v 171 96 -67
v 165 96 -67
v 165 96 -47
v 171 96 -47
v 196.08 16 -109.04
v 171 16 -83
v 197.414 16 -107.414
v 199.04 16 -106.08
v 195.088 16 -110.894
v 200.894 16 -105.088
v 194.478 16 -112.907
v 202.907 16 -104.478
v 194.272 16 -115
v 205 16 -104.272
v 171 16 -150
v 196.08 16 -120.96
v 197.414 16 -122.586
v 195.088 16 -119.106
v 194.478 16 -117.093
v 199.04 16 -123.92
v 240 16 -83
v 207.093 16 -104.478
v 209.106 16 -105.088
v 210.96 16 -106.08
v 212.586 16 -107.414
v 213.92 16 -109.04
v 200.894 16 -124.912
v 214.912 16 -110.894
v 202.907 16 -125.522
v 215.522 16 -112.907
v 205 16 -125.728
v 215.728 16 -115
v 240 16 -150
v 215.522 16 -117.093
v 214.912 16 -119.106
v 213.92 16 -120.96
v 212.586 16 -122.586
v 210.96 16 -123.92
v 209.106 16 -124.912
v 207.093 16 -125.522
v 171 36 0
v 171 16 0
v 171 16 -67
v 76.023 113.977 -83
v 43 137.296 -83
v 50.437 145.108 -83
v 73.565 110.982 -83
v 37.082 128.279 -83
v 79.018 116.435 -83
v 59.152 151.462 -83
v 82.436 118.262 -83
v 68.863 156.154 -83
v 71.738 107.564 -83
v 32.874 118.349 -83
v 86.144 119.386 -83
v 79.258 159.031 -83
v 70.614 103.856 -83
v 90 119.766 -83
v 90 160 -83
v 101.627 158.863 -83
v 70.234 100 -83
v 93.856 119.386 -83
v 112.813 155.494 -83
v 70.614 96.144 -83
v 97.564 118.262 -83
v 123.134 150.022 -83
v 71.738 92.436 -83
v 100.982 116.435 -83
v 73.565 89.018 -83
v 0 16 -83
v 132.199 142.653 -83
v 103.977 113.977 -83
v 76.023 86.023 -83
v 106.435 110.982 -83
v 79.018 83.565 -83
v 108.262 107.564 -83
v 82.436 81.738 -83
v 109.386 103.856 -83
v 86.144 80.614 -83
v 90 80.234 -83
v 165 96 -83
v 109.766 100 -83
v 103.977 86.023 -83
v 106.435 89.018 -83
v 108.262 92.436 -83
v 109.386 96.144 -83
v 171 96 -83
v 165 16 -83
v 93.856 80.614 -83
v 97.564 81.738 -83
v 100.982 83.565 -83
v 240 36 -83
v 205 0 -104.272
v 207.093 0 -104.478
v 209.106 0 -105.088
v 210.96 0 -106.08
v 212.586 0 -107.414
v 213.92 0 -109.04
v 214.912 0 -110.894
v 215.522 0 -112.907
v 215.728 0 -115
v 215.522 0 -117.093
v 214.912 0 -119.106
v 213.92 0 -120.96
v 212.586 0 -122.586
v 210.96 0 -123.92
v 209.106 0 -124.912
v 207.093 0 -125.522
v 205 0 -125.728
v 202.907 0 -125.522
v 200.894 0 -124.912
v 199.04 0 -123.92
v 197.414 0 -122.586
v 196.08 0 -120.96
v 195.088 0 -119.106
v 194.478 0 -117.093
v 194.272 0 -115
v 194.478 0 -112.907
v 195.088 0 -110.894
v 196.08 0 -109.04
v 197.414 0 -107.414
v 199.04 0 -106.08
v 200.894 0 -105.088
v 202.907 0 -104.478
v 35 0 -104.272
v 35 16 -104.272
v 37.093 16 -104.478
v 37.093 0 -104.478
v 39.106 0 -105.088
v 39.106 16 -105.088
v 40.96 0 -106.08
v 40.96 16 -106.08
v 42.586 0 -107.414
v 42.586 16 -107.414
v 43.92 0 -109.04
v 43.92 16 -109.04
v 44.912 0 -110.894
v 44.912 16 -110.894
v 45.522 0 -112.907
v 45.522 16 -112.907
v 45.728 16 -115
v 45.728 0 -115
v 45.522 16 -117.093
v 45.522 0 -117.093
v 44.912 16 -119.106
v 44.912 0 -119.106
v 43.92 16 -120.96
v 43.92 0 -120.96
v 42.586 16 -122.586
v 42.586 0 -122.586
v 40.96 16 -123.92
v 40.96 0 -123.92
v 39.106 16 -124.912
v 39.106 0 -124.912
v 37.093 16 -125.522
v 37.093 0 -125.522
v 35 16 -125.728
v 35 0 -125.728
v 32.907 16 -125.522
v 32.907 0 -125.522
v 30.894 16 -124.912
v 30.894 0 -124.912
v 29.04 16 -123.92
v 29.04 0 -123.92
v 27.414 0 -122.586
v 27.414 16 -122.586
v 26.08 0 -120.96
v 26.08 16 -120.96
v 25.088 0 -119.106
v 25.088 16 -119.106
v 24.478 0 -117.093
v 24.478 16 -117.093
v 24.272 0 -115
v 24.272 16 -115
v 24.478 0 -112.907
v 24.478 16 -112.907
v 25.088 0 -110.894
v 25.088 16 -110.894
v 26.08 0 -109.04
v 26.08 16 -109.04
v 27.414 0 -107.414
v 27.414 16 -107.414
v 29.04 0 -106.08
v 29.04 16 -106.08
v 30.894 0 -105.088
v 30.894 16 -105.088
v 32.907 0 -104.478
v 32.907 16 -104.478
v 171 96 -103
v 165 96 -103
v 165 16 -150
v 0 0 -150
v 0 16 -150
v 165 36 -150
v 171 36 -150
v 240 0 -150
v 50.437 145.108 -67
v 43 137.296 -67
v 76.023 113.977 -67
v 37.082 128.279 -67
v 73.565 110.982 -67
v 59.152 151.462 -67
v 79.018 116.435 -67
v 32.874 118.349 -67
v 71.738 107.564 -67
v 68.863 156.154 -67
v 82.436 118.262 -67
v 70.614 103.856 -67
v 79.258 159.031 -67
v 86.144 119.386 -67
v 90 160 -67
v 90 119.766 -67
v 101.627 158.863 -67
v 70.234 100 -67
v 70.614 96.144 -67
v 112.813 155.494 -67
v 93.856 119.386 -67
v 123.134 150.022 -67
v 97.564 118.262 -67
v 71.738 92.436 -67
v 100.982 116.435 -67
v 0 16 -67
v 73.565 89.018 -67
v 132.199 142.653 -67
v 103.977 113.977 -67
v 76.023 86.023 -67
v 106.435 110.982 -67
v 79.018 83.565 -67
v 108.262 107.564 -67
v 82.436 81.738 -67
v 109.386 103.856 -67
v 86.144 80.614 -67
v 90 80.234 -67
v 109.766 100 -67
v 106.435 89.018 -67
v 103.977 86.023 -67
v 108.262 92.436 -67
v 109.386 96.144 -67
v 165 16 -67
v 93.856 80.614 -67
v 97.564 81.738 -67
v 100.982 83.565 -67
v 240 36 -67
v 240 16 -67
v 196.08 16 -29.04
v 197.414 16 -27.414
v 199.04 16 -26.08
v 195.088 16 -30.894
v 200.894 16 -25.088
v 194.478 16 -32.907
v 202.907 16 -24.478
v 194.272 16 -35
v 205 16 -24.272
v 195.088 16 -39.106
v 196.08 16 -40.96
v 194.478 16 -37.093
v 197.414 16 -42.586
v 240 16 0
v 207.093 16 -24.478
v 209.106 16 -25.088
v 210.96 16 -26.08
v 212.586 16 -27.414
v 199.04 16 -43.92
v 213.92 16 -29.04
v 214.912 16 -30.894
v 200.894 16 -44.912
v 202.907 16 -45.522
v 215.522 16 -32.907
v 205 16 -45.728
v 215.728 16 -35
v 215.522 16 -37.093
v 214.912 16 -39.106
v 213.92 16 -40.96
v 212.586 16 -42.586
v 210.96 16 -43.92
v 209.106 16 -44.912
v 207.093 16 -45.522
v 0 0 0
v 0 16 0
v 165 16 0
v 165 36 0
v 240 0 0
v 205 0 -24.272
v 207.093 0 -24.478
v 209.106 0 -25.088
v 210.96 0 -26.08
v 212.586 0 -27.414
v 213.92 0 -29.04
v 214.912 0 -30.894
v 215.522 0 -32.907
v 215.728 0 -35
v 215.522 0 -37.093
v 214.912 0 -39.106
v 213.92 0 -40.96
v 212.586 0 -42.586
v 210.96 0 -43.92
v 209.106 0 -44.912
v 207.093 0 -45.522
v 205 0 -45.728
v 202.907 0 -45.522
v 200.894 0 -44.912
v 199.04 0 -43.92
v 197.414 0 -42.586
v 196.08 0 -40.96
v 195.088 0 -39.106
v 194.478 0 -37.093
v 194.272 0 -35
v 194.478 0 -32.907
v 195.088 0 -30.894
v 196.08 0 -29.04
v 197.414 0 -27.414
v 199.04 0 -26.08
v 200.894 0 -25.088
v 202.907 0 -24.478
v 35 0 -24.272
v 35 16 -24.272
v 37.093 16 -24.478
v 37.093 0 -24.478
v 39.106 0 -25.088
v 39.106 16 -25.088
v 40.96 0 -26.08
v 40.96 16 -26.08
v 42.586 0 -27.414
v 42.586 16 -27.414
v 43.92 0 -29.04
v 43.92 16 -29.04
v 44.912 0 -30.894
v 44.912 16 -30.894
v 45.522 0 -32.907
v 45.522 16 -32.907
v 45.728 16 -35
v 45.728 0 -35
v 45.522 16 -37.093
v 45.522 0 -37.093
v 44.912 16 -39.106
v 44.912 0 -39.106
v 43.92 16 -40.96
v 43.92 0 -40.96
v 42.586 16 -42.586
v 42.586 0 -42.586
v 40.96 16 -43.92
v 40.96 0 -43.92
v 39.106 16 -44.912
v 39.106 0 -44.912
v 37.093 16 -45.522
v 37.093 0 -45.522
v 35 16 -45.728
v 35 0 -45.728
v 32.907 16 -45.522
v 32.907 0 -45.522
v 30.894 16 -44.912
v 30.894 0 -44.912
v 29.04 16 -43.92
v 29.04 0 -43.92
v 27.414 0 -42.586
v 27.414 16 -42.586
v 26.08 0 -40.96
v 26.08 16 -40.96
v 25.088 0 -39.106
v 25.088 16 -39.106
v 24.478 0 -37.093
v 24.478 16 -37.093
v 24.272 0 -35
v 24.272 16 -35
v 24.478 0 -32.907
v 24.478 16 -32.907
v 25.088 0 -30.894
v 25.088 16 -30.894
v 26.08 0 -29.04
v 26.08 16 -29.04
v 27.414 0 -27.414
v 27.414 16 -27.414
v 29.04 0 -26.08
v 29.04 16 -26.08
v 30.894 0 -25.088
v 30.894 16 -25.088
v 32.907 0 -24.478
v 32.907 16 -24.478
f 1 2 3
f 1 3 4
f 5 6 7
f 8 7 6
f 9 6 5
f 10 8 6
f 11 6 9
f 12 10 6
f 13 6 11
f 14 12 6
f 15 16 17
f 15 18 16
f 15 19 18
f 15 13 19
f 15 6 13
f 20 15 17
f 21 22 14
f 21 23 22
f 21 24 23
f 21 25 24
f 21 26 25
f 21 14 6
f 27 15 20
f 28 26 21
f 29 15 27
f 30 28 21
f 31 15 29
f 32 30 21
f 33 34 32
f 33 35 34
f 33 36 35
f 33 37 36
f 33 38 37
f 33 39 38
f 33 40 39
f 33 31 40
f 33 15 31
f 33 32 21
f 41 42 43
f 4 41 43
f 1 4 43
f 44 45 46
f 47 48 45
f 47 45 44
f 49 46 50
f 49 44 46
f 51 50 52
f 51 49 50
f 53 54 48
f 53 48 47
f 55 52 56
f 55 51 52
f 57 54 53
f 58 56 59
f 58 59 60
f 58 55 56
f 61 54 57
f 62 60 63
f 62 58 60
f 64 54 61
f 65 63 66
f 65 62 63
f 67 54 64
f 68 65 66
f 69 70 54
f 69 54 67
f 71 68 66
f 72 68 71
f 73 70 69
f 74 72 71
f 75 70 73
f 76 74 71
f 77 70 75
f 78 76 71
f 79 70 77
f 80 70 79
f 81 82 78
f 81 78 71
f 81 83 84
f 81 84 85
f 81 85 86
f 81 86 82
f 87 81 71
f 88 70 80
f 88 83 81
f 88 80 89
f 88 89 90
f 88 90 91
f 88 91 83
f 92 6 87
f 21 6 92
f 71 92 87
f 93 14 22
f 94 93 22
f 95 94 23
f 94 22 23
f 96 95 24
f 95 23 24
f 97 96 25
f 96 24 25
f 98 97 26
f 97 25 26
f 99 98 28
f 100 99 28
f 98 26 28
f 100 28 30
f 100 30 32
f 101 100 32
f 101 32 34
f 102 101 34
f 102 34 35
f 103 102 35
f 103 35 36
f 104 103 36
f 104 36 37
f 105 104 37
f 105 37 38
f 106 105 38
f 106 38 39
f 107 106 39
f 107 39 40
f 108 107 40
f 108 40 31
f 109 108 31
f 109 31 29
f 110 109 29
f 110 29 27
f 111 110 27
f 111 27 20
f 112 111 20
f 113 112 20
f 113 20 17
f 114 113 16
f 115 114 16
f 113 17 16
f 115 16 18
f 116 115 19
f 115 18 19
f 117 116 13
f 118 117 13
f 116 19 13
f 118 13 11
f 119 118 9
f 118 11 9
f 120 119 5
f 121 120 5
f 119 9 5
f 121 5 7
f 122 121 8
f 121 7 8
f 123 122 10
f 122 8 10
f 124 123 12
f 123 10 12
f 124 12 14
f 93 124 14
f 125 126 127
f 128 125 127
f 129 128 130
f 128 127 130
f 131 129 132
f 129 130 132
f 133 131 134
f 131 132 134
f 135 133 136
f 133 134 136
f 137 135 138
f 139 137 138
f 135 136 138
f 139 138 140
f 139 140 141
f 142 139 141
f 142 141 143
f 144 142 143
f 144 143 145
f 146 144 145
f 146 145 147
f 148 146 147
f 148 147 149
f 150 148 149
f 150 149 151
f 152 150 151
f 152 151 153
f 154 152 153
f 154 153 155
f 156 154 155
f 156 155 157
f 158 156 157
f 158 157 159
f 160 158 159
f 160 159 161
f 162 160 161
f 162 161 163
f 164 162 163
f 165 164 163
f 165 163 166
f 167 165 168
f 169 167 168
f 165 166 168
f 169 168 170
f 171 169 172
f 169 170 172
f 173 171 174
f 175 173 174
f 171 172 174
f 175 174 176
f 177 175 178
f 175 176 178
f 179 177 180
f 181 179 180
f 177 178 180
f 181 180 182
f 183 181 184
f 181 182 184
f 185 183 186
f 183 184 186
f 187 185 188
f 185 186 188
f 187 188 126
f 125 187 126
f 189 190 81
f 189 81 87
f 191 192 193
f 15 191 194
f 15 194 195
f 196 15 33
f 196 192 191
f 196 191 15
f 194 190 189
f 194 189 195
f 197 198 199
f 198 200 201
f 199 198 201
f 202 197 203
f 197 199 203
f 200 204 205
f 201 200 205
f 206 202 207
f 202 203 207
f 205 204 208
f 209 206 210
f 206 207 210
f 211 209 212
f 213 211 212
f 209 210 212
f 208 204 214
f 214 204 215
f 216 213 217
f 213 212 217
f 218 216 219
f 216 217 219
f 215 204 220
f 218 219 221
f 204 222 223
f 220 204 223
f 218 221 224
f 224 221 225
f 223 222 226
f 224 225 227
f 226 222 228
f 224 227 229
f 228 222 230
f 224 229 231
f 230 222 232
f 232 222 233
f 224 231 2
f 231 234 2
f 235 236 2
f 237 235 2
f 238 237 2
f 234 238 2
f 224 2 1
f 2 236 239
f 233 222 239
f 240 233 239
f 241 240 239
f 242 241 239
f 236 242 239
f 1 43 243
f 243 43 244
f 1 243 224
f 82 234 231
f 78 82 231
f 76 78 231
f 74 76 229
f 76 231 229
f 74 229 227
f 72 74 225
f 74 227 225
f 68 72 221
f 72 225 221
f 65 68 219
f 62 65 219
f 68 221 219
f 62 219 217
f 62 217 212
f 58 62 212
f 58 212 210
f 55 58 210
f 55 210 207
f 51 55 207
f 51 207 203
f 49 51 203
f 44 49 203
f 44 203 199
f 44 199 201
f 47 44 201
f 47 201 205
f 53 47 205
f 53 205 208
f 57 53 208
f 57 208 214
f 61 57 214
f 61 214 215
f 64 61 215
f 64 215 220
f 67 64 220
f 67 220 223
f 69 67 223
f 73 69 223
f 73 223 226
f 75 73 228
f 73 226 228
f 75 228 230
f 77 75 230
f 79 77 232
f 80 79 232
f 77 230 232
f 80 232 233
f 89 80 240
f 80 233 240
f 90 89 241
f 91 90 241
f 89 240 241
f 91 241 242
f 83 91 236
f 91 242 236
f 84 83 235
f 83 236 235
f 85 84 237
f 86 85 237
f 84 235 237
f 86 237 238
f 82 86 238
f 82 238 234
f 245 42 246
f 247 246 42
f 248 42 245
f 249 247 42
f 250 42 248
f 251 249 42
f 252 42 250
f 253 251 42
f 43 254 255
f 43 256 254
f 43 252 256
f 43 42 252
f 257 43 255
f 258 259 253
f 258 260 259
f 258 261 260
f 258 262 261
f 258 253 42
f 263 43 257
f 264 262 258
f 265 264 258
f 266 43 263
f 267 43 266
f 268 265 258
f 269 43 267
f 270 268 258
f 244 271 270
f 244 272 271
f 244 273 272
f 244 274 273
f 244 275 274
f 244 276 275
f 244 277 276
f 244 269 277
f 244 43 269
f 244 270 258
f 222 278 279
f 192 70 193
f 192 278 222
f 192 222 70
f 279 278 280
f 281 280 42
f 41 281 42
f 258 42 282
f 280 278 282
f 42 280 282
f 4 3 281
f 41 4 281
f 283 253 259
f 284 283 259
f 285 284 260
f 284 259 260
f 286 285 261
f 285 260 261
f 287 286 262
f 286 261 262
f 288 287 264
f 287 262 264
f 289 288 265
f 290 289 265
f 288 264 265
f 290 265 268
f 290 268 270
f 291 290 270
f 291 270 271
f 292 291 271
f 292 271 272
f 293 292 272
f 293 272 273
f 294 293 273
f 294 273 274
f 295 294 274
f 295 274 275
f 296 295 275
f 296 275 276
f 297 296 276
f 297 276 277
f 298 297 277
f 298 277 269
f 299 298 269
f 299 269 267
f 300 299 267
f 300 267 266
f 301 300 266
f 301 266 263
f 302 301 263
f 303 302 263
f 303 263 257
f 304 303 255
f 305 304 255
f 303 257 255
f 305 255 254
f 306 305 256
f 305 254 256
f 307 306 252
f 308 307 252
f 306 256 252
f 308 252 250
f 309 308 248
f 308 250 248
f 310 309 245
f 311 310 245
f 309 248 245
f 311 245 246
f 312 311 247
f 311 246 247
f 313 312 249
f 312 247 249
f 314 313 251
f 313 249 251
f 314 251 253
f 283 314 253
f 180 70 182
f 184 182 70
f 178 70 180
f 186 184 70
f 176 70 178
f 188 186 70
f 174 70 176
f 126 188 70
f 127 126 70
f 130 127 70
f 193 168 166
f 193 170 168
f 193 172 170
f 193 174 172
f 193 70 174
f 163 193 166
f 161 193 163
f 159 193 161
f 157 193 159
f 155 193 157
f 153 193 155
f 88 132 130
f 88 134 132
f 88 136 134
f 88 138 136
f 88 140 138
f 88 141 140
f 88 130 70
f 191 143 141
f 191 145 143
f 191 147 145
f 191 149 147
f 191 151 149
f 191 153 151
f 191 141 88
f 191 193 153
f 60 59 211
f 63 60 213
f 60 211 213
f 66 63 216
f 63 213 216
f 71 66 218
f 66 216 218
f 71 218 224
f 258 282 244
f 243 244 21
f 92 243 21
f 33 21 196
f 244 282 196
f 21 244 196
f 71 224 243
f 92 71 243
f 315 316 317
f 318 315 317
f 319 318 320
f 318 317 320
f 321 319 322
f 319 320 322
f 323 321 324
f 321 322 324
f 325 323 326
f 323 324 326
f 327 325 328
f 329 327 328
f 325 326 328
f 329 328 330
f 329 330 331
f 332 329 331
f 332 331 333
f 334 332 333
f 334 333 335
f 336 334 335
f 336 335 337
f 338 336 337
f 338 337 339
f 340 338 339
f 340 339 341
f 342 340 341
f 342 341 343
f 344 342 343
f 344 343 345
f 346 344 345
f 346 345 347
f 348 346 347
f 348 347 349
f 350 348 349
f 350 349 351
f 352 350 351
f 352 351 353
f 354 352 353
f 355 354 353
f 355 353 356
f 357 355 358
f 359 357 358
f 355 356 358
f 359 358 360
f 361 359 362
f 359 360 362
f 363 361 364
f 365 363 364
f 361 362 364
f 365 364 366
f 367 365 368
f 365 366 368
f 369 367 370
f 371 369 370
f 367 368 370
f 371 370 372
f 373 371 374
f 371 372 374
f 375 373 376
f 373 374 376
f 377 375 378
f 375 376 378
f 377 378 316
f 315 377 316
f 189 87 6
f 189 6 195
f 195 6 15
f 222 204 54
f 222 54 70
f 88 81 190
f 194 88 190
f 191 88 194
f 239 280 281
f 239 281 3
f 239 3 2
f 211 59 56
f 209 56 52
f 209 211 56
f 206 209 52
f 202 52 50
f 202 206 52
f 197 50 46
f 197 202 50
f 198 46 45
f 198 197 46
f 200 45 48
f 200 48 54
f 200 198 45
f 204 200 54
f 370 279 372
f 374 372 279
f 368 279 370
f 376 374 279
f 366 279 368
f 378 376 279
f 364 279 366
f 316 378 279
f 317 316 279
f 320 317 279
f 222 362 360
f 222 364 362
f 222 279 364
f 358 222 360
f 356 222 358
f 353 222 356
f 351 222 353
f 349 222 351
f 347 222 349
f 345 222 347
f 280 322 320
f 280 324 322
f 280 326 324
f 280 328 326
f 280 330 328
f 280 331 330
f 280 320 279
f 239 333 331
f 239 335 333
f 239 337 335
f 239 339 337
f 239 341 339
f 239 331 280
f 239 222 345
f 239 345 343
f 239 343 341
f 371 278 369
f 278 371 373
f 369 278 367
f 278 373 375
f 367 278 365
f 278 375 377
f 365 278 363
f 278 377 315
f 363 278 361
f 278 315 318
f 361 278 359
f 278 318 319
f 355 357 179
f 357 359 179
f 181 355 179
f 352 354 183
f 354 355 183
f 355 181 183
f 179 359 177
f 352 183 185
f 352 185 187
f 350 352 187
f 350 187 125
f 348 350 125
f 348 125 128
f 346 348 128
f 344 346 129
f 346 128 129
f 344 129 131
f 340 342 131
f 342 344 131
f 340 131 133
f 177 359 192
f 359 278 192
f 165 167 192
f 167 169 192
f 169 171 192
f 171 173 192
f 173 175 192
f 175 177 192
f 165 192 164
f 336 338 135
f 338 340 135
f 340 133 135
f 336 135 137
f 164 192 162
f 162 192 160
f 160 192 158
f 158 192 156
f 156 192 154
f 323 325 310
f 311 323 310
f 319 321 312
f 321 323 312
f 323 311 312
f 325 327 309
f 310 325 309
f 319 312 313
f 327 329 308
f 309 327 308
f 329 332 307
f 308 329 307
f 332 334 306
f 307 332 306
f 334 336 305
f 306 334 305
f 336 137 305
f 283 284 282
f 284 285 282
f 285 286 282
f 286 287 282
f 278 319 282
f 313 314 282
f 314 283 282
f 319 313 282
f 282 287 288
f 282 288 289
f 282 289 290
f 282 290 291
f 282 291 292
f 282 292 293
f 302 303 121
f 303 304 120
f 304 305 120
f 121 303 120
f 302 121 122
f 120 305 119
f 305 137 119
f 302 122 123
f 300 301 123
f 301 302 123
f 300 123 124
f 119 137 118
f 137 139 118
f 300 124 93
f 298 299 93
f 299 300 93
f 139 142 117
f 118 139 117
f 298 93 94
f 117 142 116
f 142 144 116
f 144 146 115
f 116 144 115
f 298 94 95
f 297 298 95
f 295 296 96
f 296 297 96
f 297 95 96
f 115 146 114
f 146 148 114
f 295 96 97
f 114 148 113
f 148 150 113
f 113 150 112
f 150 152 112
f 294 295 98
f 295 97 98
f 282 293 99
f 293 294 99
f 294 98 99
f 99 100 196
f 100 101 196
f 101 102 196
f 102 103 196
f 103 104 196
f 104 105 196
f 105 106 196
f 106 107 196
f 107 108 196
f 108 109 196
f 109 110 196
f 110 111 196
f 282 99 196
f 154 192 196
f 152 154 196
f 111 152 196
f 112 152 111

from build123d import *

# Parameters (mm, degrees)
SKETCH_1_W                  = 240
SKETCH_1_H                  = 150
EXTRUDE_1_DEPTH             = 16
SKETCH_2_R                  = 10.728301902
CUT_EXTRUDE_1_DEPTH         = 284.471338939
PATTERN_LINEAR_1_COUNT      = 2
PATTERN_LINEAR_1_PITCH      = 170
PATTERN_LINEAR_1_COUNT_DIR2 = 2
PATTERN_LINEAR_1_PITCH_DIR2 = 80
SKETCH_3_W                  = 6
SKETCH_3_H                  = 150
EXTRUDE_2_DEPTH             = 80
CUT_EXTRUDE_2_DEPTH         = 243.777676074
SKETCH_7_W                  = 240
SKETCH_7_H                  = 16
EXTRUDE_3_DEPTH             = 144
CUT_EXTRUDE_4_DEPTH         = 301.14829668
CUT_EXTRUDE_5_DEPTH         = 301.14829668
SKETCH_15_R                 = 19.766227273
CUT_EXTRUDE_6_DEPTH         = 301.14829668


with BuildPart() as part:
    # 草图1 → 凸台-拉伸1 (new body)
    with BuildSketch(Plane(origin=(0, 0, 0), x_dir=(1, 0, 0), z_dir=(0, 1, 0))):
        with Locations((120, 75)):
            Rectangle(SKETCH_1_W, SKETCH_1_H)
    extrude(amount=EXTRUDE_1_DEPTH)

    # 草图2 → 切除-拉伸1 (cut, through all)
    with BuildSketch(Plane(origin=(0, 16, 0), x_dir=(1, 0, 0), z_dir=(0, 1, 0))):
        with Locations(Location((35, 35, 0), (0, 0, 270))):
            Circle(SKETCH_2_R)
    cut_extrude_1 = extrude(amount=-CUT_EXTRUDE_1_DEPTH, mode=Mode.SUBTRACT)

    # 阵列(线性)1: Cut-Extrude 1 2 × 2
    with Locations(*[(i * PATTERN_LINEAR_1_PITCH, 0, -j * PATTERN_LINEAR_1_PITCH_DIR2) for i in range(PATTERN_LINEAR_1_COUNT) for j in range(PATTERN_LINEAR_1_COUNT_DIR2) if (i, j) != (0, 0)]):
        add(cut_extrude_1, mode=Mode.SUBTRACT)

    # 草图3 → 凸台-拉伸2 (add)
    with BuildSketch(Plane(origin=(0, 16, 0), x_dir=(1, 0, 0), z_dir=(0, 1, 0))):
        with Locations((168, 75)):
            Rectangle(SKETCH_3_W, SKETCH_3_H)
    extrude(amount=EXTRUDE_2_DEPTH)

    # 草图4 → 切除-拉伸2 (cut, through all)
    with BuildSketch(Plane.ZY.offset(-165)):
        Polygon((0, 96), (-47, 96), (0, 36), align=None)
        Polygon((-150, 96), (-103, 96), (-150, 36), align=None)
    extrude(amount=-CUT_EXTRUDE_2_DEPTH, mode=Mode.SUBTRACT)

    # 草图7 → 凸台-拉伸3 (add)
    with BuildSketch(Plane(origin=(0, 16, 0), x_dir=(1, 0, 0), z_dir=(0, 1, 0))):
        with Locations((120, 75)):
            Rectangle(SKETCH_7_W, SKETCH_7_H)
    extrude(amount=EXTRUDE_3_DEPTH)

    # 草图12 → 切除-拉伸4 (cut, through all)
    with BuildSketch(Plane.XY.offset(-67)):
        with BuildLine():
            Line((32.874495942, 118.348754348), (0, 16))
            Line((0, 16), (0, 160))
            Line((0, 160), (90, 160))
            ThreePointArc((90, 160), (54.651204129, 148.481570008), (32.874495942, 118.348754348))
        make_face()
    extrude(amount=-CUT_EXTRUDE_4_DEPTH, mode=Mode.SUBTRACT)

    # 草图14 → 切除-拉伸5 (cut, through all)
    with BuildSketch(Plane.XY.offset(-67)):
        with BuildLine():
            Line((132.198608493, 142.652988656), (240, 36))
            Line((240, 36), (240, 160))
            Line((240, 160), (90, 160))
            ThreePointArc((90, 160), (112.812504035, 155.494050669), (132.198608493, 142.652988656))
        make_face()
    extrude(amount=-CUT_EXTRUDE_5_DEPTH, mode=Mode.SUBTRACT)

    # 草图15 → 切除-拉伸6 (cut, through all)
    with BuildSketch(Plane.XY.offset(-67)):
        with Locations((90, 100)):
            Circle(SKETCH_15_R)
    extrude(amount=-CUT_EXTRUDE_6_DEPTH, mode=Mode.SUBTRACT)


solid = part.part
